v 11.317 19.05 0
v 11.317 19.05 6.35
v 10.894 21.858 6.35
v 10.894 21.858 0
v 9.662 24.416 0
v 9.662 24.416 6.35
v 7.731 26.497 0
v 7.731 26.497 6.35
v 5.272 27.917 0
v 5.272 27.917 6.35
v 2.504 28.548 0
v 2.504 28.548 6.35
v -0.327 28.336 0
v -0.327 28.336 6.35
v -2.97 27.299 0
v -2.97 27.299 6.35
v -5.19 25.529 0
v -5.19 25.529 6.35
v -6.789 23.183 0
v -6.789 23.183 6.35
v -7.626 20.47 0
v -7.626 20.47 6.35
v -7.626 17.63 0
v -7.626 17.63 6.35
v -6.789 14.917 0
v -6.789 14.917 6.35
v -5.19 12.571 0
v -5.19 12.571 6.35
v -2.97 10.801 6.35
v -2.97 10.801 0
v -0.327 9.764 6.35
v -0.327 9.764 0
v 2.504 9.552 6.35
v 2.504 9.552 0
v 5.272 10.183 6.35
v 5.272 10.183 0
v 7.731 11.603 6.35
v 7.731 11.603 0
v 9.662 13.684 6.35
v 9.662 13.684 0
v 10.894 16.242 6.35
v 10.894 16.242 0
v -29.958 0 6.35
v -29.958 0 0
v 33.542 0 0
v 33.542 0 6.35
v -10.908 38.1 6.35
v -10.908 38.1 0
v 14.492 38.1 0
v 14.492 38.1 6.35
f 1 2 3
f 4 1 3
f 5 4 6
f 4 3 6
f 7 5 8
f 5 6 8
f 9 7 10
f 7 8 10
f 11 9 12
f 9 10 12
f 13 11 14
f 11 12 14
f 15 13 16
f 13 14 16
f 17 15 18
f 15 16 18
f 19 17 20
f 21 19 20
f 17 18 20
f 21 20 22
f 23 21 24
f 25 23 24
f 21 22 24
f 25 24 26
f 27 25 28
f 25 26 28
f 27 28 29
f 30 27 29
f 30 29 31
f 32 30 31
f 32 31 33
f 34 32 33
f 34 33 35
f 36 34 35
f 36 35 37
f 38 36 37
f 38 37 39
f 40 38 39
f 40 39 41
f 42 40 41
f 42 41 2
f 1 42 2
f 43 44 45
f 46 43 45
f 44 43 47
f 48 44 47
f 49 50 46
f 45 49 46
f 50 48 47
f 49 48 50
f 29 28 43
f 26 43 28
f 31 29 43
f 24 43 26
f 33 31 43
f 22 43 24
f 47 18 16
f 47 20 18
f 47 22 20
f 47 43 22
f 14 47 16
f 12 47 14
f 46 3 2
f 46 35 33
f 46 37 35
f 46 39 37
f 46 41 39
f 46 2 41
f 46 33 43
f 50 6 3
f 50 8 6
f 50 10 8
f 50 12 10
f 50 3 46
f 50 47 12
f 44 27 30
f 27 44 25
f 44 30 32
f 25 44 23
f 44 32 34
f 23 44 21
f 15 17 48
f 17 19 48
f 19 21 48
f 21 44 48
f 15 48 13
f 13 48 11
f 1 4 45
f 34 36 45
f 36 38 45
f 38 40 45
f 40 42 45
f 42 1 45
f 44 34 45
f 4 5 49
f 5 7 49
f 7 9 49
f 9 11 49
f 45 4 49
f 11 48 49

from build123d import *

# Parameters (mm, degrees)
F0_W     = 63.5
F0_H     = 38.1
F1_DEPTH = 6.35
F2_R     = 9.525
F3_DEPTH = 25.4


with BuildPart() as f1:
    # F0 (on Top) → F1 (new body)
    with BuildSketch(Plane.XY):
        with Locations((1.792339, 19.05)):
            Rectangle(F0_W, F0_H)
    extrude(amount=F1_DEPTH)

    # F2 (on face) → F3 (cut)
    with BuildSketch(Plane.XY.offset(6.35)):
        Polygon((-29.957661, 0), (-10.907661, 38.1), (-29.957661, 38.1), align=None)
        Polygon((33.542339, 38.1), (14.492339, 38.1), (33.542339, 0), align=None)
        with Locations((1.792339, 19.05)):
            Circle(F2_R)
    extrude(amount=-F3_DEPTH, mode=Mode.SUBTRACT)


solid = f1.part
